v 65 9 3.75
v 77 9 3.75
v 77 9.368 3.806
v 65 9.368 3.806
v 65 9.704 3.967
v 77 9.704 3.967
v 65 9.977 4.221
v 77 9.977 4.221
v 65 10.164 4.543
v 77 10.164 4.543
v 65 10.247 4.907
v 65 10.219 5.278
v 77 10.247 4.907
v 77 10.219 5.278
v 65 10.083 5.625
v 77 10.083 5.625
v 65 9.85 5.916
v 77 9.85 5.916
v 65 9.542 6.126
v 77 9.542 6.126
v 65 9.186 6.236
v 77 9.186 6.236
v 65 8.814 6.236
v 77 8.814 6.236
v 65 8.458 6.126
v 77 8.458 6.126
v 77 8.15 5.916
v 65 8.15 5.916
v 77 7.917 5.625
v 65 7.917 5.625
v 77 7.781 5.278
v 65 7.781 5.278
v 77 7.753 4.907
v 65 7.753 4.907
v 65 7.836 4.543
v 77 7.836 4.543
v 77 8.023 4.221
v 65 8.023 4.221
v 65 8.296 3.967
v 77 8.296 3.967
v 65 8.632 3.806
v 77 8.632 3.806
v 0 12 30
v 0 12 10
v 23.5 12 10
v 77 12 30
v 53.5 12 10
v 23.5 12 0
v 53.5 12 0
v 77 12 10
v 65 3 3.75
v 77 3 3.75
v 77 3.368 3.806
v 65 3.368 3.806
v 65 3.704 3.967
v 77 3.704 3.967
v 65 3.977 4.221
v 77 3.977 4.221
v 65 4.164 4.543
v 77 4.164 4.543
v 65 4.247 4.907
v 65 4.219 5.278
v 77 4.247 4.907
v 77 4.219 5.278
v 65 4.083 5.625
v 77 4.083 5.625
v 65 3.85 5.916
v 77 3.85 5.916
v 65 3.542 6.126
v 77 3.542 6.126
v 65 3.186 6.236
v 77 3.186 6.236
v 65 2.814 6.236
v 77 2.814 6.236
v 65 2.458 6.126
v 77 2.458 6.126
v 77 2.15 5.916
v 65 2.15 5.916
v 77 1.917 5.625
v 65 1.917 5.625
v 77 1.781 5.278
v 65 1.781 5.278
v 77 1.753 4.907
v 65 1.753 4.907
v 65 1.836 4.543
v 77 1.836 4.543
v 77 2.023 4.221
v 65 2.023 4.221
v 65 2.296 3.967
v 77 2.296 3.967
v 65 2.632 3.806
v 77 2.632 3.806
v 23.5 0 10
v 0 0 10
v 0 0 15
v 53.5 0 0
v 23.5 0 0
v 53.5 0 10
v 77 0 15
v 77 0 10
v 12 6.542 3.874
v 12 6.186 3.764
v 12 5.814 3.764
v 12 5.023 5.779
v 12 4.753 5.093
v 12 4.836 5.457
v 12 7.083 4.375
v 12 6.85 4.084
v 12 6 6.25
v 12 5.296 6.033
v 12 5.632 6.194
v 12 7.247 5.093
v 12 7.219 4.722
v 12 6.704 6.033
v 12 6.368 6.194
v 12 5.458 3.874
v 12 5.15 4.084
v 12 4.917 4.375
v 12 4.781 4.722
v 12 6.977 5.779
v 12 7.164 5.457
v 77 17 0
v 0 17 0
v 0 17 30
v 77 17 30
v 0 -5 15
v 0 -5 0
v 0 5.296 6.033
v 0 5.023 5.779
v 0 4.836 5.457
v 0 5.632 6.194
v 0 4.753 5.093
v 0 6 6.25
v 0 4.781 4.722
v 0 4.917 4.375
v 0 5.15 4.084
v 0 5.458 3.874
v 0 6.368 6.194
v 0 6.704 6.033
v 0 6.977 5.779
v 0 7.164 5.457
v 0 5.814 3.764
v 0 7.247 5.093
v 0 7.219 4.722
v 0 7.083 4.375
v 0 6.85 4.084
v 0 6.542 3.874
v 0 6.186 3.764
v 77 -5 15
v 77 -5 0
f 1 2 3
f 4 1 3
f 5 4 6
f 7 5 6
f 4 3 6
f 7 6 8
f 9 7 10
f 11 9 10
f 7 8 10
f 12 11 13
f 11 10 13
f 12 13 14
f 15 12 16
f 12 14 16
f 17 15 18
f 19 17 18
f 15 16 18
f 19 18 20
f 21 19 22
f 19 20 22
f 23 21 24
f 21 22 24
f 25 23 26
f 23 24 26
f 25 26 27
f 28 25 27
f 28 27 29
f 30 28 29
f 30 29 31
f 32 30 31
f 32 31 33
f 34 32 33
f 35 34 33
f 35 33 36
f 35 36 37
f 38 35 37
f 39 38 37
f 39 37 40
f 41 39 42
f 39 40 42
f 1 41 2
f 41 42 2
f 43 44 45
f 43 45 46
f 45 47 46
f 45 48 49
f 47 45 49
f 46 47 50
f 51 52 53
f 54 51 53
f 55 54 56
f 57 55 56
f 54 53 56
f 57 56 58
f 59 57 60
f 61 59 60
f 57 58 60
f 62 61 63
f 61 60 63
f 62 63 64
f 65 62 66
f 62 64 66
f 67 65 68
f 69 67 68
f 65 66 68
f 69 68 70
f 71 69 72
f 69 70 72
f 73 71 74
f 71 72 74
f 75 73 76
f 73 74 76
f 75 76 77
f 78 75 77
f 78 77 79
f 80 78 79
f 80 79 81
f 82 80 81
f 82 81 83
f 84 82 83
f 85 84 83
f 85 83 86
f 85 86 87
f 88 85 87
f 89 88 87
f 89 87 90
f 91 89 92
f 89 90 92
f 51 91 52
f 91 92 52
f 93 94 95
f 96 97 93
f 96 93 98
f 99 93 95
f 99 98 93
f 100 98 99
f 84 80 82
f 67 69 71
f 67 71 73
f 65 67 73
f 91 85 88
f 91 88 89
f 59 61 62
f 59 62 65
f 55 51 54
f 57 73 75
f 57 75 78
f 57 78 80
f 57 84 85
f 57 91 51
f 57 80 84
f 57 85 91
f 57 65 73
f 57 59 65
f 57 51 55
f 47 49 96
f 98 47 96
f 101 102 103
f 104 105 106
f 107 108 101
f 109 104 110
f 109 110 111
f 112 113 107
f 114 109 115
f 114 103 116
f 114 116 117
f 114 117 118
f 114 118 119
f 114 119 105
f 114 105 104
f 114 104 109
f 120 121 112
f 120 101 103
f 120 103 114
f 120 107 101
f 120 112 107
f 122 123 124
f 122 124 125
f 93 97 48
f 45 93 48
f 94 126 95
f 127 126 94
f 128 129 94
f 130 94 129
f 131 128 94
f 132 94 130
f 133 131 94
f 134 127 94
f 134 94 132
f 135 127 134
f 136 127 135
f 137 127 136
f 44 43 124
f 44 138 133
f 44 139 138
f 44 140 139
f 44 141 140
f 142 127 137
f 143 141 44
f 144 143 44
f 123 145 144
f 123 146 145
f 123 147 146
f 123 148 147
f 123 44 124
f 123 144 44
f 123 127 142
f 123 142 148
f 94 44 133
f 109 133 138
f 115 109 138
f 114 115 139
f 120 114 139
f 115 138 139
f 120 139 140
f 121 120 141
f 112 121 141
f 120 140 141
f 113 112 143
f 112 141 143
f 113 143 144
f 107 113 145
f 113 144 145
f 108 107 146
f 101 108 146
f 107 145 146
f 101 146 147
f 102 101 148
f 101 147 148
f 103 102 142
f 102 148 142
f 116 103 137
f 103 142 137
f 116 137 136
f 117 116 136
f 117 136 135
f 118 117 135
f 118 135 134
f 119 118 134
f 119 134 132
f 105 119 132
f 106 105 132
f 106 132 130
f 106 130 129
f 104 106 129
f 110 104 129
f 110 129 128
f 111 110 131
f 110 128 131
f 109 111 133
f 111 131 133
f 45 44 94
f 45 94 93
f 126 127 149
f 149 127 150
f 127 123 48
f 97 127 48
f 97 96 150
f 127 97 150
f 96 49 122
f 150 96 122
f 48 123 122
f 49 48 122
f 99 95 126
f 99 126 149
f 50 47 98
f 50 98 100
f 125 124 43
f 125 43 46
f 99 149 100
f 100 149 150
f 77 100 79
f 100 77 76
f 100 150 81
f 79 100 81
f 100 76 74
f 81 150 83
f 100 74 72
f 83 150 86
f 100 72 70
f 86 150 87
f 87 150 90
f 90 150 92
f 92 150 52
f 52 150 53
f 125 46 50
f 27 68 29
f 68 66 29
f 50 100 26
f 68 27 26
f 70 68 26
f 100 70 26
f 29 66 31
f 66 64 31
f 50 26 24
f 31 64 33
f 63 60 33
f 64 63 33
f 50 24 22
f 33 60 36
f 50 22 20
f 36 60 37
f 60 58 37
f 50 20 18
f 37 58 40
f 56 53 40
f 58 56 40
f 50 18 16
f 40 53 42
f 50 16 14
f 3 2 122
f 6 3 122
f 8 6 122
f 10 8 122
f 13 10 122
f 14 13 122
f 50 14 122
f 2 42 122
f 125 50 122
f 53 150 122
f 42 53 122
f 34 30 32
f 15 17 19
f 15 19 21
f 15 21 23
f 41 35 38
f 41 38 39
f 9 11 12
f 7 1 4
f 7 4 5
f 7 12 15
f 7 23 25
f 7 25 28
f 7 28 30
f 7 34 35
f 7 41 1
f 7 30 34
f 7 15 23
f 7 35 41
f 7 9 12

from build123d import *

# Parameters (mm, degrees)
SKETCH1_W           = 77
SKETCH1_H           = 12
BOSS_EXTRUDE1_DEPTH = 10
SKETCH2_R           = 1.25
CUT_EXTRUDE1_DEPTH  = 12
SKETCH3_W           = 77
SKETCH3_H           = 20
BOSS_EXTRUDE2_DEPTH = 5
SKETCH4_W           = 30
SKETCH4_H           = 6
CUT_EXTRUDE2_DEPTH  = 10
SKETCH5_W           = 78
SKETCH5_H           = 5
CUT_EXTRUDE3_DEPTH  = 5
CUT_EXTRUDE4_DEPTH  = 12
SKETCH8_W           = 77
SKETCH8_H           = 5
BOSS_EXTRUDE3_DEPTH = 10


with BuildPart() as part:
    # Sketch1 → Boss-Extrude1 (new body)
    with BuildSketch(Plane.XY):
        with Locations((38.5, 6)):
            Rectangle(SKETCH1_W, SKETCH1_H)
    extrude(amount=BOSS_EXTRUDE1_DEPTH)

    # Sketch2 → Cut-Extrude1 (cut)
    with BuildSketch(Plane(origin=(77, 0, 0), x_dir=(0, 0, -1), z_dir=(1, 0, 0))):
        with Locations((-5, 3)):
            Circle(SKETCH2_R)
        with Locations((-5, 9)):
            Circle(SKETCH2_R)
    extrude(amount=-CUT_EXTRUDE1_DEPTH, mode=Mode.SUBTRACT)

    # Sketch3 → Boss-Extrude2 (add)
    with BuildSketch(Plane(origin=(0, 12, 0), x_dir=(1, 0, 0), z_dir=(0, 1, 0))):
        with Locations((38.5, -10)):
            Rectangle(SKETCH3_W, SKETCH3_H)
    boss_extrude2 = extrude(amount=BOSS_EXTRUDE2_DEPTH)

    # Mirror2: Boss-Extrude2 across plane
    add(boss_extrude2.mirror(Plane(origin=(0, 6, 0), x_dir=(0, 0, 1), z_dir=(0, -1, 0))))

    # Sketch4 → Cut-Extrude2 (cut)
    with BuildSketch(Plane(origin=(0, 0, 0), x_dir=(-1, 0, 0), z_dir=(0, 0, -1))):
        with Locations((-38.5, 9)):
            Rectangle(SKETCH4_W, SKETCH4_H)
        with Locations((-38.5, 3)):
            Rectangle(SKETCH4_W, SKETCH4_H)
    extrude(amount=-CUT_EXTRUDE2_DEPTH, mode=Mode.SUBTRACT)

    # Sketch5 → Cut-Extrude3 (cut)
    with BuildSketch(Plane.XY.offset(20)):
        with Locations((38.5, -2.5)):
            Rectangle(SKETCH5_W, SKETCH5_H)
    extrude(amount=-CUT_EXTRUDE3_DEPTH, mode=Mode.SUBTRACT)

    # Sketch6 → Cut-Extrude4 (cut)
    with BuildSketch(Plane.ZY):
        with BuildLine():
            ThreePointArc((3.75, 6), (5, 4.75), (6.25, 6))
            Line((6.25, 6), (3.75, 6))
        make_face()
        with BuildLine():
            Line((3.75, 6), (6.25, 6))
            ThreePointArc((6.25, 6), (5, 7.25), (3.75, 6))
        make_face()
    extrude(amount=-CUT_EXTRUDE4_DEPTH, mode=Mode.SUBTRACT)

    # Sketch8 → Boss-Extrude3 (add)
    with BuildSketch(Plane.XY.offset(20)):
        with Locations((38.5, 14.5)):
            Rectangle(SKETCH8_W, SKETCH8_H)
    extrude(amount=BOSS_EXTRUDE3_DEPTH)


solid = part.part
